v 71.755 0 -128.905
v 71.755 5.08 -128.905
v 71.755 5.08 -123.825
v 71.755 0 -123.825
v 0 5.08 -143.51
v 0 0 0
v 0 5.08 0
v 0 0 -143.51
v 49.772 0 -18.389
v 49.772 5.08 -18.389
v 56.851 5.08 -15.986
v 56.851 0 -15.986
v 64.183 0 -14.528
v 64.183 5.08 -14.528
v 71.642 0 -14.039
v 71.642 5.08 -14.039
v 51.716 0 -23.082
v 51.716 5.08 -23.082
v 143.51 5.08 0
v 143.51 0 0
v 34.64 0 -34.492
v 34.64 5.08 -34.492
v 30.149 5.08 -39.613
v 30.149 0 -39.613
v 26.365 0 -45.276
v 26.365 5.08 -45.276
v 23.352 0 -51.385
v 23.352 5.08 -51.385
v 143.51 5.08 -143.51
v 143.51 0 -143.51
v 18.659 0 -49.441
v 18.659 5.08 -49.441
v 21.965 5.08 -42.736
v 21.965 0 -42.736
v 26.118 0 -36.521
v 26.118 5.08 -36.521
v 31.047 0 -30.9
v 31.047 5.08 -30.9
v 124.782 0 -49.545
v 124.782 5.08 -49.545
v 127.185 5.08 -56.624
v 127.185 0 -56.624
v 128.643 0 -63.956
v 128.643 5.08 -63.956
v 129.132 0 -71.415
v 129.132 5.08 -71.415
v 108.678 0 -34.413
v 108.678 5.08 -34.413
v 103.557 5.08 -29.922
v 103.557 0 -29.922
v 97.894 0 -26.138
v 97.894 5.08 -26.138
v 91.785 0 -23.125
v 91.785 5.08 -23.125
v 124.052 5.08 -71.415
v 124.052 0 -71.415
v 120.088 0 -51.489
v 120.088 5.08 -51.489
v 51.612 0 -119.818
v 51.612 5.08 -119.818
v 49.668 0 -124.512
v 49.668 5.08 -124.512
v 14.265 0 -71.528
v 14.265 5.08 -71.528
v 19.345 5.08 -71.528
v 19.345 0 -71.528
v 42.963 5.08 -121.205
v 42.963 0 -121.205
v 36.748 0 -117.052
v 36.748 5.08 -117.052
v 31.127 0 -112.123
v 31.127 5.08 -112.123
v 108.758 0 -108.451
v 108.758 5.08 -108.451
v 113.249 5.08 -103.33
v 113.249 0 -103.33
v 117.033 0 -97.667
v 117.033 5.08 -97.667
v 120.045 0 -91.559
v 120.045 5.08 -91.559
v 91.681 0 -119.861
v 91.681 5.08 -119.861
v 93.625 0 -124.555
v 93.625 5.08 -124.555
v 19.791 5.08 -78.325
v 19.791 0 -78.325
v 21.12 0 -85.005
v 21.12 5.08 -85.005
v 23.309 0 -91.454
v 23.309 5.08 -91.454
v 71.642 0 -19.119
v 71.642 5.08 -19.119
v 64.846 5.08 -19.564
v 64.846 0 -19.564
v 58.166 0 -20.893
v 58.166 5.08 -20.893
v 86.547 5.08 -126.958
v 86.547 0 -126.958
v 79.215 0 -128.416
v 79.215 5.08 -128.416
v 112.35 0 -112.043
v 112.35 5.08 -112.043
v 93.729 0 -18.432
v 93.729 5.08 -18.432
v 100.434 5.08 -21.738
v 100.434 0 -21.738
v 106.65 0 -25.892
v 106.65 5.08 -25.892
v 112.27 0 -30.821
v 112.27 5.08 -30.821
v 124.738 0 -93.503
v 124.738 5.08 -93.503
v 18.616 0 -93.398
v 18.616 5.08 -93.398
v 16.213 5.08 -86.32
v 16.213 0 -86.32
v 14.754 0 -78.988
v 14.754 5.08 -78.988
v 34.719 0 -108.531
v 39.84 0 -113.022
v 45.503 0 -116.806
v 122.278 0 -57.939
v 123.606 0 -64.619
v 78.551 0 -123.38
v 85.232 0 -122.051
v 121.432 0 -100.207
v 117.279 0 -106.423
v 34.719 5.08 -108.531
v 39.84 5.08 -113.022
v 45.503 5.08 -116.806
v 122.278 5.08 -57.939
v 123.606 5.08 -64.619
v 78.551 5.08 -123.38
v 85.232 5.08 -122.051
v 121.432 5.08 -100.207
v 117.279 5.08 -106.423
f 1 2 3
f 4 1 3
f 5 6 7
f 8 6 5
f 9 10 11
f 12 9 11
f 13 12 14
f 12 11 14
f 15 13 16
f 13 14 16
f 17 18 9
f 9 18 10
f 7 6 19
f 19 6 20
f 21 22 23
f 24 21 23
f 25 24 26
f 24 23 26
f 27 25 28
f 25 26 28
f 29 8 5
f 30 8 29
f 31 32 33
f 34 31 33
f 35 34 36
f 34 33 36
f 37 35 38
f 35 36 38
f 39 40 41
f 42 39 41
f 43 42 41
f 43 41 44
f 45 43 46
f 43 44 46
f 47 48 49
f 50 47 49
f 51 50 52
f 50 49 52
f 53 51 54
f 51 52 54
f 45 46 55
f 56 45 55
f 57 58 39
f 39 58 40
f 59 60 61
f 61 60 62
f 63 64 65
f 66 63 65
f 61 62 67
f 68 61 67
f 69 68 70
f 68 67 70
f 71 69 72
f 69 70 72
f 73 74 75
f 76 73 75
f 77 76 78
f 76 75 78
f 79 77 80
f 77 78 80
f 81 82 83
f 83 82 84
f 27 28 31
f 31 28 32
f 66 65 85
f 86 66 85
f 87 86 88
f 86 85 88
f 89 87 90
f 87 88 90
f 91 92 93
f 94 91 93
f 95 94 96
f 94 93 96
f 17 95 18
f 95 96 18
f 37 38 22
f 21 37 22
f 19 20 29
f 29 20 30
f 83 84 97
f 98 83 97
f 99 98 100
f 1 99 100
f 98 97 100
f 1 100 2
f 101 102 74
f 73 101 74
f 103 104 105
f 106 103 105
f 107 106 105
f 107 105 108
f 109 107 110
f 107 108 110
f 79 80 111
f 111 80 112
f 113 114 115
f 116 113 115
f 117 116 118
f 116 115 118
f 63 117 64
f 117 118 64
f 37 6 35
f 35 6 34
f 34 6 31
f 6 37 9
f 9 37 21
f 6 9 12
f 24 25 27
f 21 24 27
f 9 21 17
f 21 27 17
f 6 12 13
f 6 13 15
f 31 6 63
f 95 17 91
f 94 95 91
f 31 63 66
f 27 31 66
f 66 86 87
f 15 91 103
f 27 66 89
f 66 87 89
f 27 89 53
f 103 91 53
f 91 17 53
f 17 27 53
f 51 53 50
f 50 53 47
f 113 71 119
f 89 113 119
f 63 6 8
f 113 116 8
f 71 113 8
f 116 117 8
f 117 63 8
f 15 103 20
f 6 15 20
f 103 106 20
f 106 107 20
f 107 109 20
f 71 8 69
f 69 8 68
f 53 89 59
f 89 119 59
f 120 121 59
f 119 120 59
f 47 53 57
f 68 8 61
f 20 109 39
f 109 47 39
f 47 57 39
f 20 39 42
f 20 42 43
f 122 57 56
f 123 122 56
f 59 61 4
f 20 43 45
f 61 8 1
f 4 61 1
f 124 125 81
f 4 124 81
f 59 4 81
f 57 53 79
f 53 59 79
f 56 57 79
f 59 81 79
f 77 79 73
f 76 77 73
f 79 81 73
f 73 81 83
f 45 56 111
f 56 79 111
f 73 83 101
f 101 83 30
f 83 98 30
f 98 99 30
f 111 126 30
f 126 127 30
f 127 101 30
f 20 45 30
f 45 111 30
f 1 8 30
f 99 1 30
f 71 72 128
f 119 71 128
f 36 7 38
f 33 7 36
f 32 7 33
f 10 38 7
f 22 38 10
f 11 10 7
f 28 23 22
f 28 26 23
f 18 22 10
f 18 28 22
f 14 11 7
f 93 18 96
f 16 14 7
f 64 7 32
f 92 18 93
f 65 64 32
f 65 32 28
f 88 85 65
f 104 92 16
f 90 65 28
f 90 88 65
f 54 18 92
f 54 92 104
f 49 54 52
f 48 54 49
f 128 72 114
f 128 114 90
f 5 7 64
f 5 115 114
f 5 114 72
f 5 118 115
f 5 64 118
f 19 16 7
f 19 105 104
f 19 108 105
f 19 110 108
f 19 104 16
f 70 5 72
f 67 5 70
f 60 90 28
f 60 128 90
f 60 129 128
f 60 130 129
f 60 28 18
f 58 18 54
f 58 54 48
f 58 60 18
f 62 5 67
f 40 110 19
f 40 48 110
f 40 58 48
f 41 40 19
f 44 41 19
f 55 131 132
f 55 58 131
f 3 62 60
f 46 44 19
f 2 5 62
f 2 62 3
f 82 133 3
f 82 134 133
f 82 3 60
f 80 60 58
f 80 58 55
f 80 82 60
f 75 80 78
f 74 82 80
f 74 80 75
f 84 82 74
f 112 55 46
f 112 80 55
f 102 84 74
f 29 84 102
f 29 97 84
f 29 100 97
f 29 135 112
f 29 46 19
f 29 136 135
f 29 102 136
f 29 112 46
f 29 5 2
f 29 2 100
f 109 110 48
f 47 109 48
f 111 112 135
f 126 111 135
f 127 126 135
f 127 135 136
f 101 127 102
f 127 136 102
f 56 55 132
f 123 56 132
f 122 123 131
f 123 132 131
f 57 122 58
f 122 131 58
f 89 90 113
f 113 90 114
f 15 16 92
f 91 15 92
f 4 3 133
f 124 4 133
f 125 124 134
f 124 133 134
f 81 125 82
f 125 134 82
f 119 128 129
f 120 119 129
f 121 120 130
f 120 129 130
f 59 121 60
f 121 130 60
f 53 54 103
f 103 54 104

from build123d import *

# Parameters (mm, degrees)
SKETCH1_W           = 143.51
SKETCH1_H           = 143.51
BOSS_EXTRUDE1_DEPTH = 5.08
CUT_EXTRUDE1_DEPTH  = 6.08
CIRPATTERN1_COUNT   = 8


with BuildPart() as part:
    # Sketch1 → Boss-Extrude1 (new body)
    with BuildSketch(Plane(origin=(0, 0, 0), x_dir=(1, 0, 0), z_dir=(0, 1, 0))):
        with Locations((71.755, 71.755)):
            Rectangle(SKETCH1_W, SKETCH1_H)
    extrude(amount=BOSS_EXTRUDE1_DEPTH)

    # Sketch3 → Cut-Extrude1 (cut, through all)
    with BuildSketch(Plane(origin=(0, 5.08, 0), x_dir=(1, 0, 0), z_dir=(0, 1, 0))):
        with BuildLine():
            Line((71.755, 128.905), (71.755, 123.825))
            ThreePointArc((71.755, 123.825), (81.913353067, 122.824489551), (91.681326323, 119.861407258))
            Line((91.681326323, 119.861407258), (93.62535816, 124.554715283))
            ThreePointArc((93.62535816, 124.554715283), (82.904411903, 127.806878775), (71.755, 128.905))
        make_face()
    cut_extrude1 = extrude(amount=-CUT_EXTRUDE1_DEPTH, mode=Mode.SUBTRACT)

    # CirPattern1: Cut-Extrude1 ×8 about axis
    cirpattern1_axis = Axis((71.698667162, 0, -71.471795698), (0, 1, 0))
    for i in range(1, CIRPATTERN1_COUNT):
        add(cut_extrude1.rotate(cirpattern1_axis, i * 360 / CIRPATTERN1_COUNT), mode=Mode.SUBTRACT)


solid = part.part
